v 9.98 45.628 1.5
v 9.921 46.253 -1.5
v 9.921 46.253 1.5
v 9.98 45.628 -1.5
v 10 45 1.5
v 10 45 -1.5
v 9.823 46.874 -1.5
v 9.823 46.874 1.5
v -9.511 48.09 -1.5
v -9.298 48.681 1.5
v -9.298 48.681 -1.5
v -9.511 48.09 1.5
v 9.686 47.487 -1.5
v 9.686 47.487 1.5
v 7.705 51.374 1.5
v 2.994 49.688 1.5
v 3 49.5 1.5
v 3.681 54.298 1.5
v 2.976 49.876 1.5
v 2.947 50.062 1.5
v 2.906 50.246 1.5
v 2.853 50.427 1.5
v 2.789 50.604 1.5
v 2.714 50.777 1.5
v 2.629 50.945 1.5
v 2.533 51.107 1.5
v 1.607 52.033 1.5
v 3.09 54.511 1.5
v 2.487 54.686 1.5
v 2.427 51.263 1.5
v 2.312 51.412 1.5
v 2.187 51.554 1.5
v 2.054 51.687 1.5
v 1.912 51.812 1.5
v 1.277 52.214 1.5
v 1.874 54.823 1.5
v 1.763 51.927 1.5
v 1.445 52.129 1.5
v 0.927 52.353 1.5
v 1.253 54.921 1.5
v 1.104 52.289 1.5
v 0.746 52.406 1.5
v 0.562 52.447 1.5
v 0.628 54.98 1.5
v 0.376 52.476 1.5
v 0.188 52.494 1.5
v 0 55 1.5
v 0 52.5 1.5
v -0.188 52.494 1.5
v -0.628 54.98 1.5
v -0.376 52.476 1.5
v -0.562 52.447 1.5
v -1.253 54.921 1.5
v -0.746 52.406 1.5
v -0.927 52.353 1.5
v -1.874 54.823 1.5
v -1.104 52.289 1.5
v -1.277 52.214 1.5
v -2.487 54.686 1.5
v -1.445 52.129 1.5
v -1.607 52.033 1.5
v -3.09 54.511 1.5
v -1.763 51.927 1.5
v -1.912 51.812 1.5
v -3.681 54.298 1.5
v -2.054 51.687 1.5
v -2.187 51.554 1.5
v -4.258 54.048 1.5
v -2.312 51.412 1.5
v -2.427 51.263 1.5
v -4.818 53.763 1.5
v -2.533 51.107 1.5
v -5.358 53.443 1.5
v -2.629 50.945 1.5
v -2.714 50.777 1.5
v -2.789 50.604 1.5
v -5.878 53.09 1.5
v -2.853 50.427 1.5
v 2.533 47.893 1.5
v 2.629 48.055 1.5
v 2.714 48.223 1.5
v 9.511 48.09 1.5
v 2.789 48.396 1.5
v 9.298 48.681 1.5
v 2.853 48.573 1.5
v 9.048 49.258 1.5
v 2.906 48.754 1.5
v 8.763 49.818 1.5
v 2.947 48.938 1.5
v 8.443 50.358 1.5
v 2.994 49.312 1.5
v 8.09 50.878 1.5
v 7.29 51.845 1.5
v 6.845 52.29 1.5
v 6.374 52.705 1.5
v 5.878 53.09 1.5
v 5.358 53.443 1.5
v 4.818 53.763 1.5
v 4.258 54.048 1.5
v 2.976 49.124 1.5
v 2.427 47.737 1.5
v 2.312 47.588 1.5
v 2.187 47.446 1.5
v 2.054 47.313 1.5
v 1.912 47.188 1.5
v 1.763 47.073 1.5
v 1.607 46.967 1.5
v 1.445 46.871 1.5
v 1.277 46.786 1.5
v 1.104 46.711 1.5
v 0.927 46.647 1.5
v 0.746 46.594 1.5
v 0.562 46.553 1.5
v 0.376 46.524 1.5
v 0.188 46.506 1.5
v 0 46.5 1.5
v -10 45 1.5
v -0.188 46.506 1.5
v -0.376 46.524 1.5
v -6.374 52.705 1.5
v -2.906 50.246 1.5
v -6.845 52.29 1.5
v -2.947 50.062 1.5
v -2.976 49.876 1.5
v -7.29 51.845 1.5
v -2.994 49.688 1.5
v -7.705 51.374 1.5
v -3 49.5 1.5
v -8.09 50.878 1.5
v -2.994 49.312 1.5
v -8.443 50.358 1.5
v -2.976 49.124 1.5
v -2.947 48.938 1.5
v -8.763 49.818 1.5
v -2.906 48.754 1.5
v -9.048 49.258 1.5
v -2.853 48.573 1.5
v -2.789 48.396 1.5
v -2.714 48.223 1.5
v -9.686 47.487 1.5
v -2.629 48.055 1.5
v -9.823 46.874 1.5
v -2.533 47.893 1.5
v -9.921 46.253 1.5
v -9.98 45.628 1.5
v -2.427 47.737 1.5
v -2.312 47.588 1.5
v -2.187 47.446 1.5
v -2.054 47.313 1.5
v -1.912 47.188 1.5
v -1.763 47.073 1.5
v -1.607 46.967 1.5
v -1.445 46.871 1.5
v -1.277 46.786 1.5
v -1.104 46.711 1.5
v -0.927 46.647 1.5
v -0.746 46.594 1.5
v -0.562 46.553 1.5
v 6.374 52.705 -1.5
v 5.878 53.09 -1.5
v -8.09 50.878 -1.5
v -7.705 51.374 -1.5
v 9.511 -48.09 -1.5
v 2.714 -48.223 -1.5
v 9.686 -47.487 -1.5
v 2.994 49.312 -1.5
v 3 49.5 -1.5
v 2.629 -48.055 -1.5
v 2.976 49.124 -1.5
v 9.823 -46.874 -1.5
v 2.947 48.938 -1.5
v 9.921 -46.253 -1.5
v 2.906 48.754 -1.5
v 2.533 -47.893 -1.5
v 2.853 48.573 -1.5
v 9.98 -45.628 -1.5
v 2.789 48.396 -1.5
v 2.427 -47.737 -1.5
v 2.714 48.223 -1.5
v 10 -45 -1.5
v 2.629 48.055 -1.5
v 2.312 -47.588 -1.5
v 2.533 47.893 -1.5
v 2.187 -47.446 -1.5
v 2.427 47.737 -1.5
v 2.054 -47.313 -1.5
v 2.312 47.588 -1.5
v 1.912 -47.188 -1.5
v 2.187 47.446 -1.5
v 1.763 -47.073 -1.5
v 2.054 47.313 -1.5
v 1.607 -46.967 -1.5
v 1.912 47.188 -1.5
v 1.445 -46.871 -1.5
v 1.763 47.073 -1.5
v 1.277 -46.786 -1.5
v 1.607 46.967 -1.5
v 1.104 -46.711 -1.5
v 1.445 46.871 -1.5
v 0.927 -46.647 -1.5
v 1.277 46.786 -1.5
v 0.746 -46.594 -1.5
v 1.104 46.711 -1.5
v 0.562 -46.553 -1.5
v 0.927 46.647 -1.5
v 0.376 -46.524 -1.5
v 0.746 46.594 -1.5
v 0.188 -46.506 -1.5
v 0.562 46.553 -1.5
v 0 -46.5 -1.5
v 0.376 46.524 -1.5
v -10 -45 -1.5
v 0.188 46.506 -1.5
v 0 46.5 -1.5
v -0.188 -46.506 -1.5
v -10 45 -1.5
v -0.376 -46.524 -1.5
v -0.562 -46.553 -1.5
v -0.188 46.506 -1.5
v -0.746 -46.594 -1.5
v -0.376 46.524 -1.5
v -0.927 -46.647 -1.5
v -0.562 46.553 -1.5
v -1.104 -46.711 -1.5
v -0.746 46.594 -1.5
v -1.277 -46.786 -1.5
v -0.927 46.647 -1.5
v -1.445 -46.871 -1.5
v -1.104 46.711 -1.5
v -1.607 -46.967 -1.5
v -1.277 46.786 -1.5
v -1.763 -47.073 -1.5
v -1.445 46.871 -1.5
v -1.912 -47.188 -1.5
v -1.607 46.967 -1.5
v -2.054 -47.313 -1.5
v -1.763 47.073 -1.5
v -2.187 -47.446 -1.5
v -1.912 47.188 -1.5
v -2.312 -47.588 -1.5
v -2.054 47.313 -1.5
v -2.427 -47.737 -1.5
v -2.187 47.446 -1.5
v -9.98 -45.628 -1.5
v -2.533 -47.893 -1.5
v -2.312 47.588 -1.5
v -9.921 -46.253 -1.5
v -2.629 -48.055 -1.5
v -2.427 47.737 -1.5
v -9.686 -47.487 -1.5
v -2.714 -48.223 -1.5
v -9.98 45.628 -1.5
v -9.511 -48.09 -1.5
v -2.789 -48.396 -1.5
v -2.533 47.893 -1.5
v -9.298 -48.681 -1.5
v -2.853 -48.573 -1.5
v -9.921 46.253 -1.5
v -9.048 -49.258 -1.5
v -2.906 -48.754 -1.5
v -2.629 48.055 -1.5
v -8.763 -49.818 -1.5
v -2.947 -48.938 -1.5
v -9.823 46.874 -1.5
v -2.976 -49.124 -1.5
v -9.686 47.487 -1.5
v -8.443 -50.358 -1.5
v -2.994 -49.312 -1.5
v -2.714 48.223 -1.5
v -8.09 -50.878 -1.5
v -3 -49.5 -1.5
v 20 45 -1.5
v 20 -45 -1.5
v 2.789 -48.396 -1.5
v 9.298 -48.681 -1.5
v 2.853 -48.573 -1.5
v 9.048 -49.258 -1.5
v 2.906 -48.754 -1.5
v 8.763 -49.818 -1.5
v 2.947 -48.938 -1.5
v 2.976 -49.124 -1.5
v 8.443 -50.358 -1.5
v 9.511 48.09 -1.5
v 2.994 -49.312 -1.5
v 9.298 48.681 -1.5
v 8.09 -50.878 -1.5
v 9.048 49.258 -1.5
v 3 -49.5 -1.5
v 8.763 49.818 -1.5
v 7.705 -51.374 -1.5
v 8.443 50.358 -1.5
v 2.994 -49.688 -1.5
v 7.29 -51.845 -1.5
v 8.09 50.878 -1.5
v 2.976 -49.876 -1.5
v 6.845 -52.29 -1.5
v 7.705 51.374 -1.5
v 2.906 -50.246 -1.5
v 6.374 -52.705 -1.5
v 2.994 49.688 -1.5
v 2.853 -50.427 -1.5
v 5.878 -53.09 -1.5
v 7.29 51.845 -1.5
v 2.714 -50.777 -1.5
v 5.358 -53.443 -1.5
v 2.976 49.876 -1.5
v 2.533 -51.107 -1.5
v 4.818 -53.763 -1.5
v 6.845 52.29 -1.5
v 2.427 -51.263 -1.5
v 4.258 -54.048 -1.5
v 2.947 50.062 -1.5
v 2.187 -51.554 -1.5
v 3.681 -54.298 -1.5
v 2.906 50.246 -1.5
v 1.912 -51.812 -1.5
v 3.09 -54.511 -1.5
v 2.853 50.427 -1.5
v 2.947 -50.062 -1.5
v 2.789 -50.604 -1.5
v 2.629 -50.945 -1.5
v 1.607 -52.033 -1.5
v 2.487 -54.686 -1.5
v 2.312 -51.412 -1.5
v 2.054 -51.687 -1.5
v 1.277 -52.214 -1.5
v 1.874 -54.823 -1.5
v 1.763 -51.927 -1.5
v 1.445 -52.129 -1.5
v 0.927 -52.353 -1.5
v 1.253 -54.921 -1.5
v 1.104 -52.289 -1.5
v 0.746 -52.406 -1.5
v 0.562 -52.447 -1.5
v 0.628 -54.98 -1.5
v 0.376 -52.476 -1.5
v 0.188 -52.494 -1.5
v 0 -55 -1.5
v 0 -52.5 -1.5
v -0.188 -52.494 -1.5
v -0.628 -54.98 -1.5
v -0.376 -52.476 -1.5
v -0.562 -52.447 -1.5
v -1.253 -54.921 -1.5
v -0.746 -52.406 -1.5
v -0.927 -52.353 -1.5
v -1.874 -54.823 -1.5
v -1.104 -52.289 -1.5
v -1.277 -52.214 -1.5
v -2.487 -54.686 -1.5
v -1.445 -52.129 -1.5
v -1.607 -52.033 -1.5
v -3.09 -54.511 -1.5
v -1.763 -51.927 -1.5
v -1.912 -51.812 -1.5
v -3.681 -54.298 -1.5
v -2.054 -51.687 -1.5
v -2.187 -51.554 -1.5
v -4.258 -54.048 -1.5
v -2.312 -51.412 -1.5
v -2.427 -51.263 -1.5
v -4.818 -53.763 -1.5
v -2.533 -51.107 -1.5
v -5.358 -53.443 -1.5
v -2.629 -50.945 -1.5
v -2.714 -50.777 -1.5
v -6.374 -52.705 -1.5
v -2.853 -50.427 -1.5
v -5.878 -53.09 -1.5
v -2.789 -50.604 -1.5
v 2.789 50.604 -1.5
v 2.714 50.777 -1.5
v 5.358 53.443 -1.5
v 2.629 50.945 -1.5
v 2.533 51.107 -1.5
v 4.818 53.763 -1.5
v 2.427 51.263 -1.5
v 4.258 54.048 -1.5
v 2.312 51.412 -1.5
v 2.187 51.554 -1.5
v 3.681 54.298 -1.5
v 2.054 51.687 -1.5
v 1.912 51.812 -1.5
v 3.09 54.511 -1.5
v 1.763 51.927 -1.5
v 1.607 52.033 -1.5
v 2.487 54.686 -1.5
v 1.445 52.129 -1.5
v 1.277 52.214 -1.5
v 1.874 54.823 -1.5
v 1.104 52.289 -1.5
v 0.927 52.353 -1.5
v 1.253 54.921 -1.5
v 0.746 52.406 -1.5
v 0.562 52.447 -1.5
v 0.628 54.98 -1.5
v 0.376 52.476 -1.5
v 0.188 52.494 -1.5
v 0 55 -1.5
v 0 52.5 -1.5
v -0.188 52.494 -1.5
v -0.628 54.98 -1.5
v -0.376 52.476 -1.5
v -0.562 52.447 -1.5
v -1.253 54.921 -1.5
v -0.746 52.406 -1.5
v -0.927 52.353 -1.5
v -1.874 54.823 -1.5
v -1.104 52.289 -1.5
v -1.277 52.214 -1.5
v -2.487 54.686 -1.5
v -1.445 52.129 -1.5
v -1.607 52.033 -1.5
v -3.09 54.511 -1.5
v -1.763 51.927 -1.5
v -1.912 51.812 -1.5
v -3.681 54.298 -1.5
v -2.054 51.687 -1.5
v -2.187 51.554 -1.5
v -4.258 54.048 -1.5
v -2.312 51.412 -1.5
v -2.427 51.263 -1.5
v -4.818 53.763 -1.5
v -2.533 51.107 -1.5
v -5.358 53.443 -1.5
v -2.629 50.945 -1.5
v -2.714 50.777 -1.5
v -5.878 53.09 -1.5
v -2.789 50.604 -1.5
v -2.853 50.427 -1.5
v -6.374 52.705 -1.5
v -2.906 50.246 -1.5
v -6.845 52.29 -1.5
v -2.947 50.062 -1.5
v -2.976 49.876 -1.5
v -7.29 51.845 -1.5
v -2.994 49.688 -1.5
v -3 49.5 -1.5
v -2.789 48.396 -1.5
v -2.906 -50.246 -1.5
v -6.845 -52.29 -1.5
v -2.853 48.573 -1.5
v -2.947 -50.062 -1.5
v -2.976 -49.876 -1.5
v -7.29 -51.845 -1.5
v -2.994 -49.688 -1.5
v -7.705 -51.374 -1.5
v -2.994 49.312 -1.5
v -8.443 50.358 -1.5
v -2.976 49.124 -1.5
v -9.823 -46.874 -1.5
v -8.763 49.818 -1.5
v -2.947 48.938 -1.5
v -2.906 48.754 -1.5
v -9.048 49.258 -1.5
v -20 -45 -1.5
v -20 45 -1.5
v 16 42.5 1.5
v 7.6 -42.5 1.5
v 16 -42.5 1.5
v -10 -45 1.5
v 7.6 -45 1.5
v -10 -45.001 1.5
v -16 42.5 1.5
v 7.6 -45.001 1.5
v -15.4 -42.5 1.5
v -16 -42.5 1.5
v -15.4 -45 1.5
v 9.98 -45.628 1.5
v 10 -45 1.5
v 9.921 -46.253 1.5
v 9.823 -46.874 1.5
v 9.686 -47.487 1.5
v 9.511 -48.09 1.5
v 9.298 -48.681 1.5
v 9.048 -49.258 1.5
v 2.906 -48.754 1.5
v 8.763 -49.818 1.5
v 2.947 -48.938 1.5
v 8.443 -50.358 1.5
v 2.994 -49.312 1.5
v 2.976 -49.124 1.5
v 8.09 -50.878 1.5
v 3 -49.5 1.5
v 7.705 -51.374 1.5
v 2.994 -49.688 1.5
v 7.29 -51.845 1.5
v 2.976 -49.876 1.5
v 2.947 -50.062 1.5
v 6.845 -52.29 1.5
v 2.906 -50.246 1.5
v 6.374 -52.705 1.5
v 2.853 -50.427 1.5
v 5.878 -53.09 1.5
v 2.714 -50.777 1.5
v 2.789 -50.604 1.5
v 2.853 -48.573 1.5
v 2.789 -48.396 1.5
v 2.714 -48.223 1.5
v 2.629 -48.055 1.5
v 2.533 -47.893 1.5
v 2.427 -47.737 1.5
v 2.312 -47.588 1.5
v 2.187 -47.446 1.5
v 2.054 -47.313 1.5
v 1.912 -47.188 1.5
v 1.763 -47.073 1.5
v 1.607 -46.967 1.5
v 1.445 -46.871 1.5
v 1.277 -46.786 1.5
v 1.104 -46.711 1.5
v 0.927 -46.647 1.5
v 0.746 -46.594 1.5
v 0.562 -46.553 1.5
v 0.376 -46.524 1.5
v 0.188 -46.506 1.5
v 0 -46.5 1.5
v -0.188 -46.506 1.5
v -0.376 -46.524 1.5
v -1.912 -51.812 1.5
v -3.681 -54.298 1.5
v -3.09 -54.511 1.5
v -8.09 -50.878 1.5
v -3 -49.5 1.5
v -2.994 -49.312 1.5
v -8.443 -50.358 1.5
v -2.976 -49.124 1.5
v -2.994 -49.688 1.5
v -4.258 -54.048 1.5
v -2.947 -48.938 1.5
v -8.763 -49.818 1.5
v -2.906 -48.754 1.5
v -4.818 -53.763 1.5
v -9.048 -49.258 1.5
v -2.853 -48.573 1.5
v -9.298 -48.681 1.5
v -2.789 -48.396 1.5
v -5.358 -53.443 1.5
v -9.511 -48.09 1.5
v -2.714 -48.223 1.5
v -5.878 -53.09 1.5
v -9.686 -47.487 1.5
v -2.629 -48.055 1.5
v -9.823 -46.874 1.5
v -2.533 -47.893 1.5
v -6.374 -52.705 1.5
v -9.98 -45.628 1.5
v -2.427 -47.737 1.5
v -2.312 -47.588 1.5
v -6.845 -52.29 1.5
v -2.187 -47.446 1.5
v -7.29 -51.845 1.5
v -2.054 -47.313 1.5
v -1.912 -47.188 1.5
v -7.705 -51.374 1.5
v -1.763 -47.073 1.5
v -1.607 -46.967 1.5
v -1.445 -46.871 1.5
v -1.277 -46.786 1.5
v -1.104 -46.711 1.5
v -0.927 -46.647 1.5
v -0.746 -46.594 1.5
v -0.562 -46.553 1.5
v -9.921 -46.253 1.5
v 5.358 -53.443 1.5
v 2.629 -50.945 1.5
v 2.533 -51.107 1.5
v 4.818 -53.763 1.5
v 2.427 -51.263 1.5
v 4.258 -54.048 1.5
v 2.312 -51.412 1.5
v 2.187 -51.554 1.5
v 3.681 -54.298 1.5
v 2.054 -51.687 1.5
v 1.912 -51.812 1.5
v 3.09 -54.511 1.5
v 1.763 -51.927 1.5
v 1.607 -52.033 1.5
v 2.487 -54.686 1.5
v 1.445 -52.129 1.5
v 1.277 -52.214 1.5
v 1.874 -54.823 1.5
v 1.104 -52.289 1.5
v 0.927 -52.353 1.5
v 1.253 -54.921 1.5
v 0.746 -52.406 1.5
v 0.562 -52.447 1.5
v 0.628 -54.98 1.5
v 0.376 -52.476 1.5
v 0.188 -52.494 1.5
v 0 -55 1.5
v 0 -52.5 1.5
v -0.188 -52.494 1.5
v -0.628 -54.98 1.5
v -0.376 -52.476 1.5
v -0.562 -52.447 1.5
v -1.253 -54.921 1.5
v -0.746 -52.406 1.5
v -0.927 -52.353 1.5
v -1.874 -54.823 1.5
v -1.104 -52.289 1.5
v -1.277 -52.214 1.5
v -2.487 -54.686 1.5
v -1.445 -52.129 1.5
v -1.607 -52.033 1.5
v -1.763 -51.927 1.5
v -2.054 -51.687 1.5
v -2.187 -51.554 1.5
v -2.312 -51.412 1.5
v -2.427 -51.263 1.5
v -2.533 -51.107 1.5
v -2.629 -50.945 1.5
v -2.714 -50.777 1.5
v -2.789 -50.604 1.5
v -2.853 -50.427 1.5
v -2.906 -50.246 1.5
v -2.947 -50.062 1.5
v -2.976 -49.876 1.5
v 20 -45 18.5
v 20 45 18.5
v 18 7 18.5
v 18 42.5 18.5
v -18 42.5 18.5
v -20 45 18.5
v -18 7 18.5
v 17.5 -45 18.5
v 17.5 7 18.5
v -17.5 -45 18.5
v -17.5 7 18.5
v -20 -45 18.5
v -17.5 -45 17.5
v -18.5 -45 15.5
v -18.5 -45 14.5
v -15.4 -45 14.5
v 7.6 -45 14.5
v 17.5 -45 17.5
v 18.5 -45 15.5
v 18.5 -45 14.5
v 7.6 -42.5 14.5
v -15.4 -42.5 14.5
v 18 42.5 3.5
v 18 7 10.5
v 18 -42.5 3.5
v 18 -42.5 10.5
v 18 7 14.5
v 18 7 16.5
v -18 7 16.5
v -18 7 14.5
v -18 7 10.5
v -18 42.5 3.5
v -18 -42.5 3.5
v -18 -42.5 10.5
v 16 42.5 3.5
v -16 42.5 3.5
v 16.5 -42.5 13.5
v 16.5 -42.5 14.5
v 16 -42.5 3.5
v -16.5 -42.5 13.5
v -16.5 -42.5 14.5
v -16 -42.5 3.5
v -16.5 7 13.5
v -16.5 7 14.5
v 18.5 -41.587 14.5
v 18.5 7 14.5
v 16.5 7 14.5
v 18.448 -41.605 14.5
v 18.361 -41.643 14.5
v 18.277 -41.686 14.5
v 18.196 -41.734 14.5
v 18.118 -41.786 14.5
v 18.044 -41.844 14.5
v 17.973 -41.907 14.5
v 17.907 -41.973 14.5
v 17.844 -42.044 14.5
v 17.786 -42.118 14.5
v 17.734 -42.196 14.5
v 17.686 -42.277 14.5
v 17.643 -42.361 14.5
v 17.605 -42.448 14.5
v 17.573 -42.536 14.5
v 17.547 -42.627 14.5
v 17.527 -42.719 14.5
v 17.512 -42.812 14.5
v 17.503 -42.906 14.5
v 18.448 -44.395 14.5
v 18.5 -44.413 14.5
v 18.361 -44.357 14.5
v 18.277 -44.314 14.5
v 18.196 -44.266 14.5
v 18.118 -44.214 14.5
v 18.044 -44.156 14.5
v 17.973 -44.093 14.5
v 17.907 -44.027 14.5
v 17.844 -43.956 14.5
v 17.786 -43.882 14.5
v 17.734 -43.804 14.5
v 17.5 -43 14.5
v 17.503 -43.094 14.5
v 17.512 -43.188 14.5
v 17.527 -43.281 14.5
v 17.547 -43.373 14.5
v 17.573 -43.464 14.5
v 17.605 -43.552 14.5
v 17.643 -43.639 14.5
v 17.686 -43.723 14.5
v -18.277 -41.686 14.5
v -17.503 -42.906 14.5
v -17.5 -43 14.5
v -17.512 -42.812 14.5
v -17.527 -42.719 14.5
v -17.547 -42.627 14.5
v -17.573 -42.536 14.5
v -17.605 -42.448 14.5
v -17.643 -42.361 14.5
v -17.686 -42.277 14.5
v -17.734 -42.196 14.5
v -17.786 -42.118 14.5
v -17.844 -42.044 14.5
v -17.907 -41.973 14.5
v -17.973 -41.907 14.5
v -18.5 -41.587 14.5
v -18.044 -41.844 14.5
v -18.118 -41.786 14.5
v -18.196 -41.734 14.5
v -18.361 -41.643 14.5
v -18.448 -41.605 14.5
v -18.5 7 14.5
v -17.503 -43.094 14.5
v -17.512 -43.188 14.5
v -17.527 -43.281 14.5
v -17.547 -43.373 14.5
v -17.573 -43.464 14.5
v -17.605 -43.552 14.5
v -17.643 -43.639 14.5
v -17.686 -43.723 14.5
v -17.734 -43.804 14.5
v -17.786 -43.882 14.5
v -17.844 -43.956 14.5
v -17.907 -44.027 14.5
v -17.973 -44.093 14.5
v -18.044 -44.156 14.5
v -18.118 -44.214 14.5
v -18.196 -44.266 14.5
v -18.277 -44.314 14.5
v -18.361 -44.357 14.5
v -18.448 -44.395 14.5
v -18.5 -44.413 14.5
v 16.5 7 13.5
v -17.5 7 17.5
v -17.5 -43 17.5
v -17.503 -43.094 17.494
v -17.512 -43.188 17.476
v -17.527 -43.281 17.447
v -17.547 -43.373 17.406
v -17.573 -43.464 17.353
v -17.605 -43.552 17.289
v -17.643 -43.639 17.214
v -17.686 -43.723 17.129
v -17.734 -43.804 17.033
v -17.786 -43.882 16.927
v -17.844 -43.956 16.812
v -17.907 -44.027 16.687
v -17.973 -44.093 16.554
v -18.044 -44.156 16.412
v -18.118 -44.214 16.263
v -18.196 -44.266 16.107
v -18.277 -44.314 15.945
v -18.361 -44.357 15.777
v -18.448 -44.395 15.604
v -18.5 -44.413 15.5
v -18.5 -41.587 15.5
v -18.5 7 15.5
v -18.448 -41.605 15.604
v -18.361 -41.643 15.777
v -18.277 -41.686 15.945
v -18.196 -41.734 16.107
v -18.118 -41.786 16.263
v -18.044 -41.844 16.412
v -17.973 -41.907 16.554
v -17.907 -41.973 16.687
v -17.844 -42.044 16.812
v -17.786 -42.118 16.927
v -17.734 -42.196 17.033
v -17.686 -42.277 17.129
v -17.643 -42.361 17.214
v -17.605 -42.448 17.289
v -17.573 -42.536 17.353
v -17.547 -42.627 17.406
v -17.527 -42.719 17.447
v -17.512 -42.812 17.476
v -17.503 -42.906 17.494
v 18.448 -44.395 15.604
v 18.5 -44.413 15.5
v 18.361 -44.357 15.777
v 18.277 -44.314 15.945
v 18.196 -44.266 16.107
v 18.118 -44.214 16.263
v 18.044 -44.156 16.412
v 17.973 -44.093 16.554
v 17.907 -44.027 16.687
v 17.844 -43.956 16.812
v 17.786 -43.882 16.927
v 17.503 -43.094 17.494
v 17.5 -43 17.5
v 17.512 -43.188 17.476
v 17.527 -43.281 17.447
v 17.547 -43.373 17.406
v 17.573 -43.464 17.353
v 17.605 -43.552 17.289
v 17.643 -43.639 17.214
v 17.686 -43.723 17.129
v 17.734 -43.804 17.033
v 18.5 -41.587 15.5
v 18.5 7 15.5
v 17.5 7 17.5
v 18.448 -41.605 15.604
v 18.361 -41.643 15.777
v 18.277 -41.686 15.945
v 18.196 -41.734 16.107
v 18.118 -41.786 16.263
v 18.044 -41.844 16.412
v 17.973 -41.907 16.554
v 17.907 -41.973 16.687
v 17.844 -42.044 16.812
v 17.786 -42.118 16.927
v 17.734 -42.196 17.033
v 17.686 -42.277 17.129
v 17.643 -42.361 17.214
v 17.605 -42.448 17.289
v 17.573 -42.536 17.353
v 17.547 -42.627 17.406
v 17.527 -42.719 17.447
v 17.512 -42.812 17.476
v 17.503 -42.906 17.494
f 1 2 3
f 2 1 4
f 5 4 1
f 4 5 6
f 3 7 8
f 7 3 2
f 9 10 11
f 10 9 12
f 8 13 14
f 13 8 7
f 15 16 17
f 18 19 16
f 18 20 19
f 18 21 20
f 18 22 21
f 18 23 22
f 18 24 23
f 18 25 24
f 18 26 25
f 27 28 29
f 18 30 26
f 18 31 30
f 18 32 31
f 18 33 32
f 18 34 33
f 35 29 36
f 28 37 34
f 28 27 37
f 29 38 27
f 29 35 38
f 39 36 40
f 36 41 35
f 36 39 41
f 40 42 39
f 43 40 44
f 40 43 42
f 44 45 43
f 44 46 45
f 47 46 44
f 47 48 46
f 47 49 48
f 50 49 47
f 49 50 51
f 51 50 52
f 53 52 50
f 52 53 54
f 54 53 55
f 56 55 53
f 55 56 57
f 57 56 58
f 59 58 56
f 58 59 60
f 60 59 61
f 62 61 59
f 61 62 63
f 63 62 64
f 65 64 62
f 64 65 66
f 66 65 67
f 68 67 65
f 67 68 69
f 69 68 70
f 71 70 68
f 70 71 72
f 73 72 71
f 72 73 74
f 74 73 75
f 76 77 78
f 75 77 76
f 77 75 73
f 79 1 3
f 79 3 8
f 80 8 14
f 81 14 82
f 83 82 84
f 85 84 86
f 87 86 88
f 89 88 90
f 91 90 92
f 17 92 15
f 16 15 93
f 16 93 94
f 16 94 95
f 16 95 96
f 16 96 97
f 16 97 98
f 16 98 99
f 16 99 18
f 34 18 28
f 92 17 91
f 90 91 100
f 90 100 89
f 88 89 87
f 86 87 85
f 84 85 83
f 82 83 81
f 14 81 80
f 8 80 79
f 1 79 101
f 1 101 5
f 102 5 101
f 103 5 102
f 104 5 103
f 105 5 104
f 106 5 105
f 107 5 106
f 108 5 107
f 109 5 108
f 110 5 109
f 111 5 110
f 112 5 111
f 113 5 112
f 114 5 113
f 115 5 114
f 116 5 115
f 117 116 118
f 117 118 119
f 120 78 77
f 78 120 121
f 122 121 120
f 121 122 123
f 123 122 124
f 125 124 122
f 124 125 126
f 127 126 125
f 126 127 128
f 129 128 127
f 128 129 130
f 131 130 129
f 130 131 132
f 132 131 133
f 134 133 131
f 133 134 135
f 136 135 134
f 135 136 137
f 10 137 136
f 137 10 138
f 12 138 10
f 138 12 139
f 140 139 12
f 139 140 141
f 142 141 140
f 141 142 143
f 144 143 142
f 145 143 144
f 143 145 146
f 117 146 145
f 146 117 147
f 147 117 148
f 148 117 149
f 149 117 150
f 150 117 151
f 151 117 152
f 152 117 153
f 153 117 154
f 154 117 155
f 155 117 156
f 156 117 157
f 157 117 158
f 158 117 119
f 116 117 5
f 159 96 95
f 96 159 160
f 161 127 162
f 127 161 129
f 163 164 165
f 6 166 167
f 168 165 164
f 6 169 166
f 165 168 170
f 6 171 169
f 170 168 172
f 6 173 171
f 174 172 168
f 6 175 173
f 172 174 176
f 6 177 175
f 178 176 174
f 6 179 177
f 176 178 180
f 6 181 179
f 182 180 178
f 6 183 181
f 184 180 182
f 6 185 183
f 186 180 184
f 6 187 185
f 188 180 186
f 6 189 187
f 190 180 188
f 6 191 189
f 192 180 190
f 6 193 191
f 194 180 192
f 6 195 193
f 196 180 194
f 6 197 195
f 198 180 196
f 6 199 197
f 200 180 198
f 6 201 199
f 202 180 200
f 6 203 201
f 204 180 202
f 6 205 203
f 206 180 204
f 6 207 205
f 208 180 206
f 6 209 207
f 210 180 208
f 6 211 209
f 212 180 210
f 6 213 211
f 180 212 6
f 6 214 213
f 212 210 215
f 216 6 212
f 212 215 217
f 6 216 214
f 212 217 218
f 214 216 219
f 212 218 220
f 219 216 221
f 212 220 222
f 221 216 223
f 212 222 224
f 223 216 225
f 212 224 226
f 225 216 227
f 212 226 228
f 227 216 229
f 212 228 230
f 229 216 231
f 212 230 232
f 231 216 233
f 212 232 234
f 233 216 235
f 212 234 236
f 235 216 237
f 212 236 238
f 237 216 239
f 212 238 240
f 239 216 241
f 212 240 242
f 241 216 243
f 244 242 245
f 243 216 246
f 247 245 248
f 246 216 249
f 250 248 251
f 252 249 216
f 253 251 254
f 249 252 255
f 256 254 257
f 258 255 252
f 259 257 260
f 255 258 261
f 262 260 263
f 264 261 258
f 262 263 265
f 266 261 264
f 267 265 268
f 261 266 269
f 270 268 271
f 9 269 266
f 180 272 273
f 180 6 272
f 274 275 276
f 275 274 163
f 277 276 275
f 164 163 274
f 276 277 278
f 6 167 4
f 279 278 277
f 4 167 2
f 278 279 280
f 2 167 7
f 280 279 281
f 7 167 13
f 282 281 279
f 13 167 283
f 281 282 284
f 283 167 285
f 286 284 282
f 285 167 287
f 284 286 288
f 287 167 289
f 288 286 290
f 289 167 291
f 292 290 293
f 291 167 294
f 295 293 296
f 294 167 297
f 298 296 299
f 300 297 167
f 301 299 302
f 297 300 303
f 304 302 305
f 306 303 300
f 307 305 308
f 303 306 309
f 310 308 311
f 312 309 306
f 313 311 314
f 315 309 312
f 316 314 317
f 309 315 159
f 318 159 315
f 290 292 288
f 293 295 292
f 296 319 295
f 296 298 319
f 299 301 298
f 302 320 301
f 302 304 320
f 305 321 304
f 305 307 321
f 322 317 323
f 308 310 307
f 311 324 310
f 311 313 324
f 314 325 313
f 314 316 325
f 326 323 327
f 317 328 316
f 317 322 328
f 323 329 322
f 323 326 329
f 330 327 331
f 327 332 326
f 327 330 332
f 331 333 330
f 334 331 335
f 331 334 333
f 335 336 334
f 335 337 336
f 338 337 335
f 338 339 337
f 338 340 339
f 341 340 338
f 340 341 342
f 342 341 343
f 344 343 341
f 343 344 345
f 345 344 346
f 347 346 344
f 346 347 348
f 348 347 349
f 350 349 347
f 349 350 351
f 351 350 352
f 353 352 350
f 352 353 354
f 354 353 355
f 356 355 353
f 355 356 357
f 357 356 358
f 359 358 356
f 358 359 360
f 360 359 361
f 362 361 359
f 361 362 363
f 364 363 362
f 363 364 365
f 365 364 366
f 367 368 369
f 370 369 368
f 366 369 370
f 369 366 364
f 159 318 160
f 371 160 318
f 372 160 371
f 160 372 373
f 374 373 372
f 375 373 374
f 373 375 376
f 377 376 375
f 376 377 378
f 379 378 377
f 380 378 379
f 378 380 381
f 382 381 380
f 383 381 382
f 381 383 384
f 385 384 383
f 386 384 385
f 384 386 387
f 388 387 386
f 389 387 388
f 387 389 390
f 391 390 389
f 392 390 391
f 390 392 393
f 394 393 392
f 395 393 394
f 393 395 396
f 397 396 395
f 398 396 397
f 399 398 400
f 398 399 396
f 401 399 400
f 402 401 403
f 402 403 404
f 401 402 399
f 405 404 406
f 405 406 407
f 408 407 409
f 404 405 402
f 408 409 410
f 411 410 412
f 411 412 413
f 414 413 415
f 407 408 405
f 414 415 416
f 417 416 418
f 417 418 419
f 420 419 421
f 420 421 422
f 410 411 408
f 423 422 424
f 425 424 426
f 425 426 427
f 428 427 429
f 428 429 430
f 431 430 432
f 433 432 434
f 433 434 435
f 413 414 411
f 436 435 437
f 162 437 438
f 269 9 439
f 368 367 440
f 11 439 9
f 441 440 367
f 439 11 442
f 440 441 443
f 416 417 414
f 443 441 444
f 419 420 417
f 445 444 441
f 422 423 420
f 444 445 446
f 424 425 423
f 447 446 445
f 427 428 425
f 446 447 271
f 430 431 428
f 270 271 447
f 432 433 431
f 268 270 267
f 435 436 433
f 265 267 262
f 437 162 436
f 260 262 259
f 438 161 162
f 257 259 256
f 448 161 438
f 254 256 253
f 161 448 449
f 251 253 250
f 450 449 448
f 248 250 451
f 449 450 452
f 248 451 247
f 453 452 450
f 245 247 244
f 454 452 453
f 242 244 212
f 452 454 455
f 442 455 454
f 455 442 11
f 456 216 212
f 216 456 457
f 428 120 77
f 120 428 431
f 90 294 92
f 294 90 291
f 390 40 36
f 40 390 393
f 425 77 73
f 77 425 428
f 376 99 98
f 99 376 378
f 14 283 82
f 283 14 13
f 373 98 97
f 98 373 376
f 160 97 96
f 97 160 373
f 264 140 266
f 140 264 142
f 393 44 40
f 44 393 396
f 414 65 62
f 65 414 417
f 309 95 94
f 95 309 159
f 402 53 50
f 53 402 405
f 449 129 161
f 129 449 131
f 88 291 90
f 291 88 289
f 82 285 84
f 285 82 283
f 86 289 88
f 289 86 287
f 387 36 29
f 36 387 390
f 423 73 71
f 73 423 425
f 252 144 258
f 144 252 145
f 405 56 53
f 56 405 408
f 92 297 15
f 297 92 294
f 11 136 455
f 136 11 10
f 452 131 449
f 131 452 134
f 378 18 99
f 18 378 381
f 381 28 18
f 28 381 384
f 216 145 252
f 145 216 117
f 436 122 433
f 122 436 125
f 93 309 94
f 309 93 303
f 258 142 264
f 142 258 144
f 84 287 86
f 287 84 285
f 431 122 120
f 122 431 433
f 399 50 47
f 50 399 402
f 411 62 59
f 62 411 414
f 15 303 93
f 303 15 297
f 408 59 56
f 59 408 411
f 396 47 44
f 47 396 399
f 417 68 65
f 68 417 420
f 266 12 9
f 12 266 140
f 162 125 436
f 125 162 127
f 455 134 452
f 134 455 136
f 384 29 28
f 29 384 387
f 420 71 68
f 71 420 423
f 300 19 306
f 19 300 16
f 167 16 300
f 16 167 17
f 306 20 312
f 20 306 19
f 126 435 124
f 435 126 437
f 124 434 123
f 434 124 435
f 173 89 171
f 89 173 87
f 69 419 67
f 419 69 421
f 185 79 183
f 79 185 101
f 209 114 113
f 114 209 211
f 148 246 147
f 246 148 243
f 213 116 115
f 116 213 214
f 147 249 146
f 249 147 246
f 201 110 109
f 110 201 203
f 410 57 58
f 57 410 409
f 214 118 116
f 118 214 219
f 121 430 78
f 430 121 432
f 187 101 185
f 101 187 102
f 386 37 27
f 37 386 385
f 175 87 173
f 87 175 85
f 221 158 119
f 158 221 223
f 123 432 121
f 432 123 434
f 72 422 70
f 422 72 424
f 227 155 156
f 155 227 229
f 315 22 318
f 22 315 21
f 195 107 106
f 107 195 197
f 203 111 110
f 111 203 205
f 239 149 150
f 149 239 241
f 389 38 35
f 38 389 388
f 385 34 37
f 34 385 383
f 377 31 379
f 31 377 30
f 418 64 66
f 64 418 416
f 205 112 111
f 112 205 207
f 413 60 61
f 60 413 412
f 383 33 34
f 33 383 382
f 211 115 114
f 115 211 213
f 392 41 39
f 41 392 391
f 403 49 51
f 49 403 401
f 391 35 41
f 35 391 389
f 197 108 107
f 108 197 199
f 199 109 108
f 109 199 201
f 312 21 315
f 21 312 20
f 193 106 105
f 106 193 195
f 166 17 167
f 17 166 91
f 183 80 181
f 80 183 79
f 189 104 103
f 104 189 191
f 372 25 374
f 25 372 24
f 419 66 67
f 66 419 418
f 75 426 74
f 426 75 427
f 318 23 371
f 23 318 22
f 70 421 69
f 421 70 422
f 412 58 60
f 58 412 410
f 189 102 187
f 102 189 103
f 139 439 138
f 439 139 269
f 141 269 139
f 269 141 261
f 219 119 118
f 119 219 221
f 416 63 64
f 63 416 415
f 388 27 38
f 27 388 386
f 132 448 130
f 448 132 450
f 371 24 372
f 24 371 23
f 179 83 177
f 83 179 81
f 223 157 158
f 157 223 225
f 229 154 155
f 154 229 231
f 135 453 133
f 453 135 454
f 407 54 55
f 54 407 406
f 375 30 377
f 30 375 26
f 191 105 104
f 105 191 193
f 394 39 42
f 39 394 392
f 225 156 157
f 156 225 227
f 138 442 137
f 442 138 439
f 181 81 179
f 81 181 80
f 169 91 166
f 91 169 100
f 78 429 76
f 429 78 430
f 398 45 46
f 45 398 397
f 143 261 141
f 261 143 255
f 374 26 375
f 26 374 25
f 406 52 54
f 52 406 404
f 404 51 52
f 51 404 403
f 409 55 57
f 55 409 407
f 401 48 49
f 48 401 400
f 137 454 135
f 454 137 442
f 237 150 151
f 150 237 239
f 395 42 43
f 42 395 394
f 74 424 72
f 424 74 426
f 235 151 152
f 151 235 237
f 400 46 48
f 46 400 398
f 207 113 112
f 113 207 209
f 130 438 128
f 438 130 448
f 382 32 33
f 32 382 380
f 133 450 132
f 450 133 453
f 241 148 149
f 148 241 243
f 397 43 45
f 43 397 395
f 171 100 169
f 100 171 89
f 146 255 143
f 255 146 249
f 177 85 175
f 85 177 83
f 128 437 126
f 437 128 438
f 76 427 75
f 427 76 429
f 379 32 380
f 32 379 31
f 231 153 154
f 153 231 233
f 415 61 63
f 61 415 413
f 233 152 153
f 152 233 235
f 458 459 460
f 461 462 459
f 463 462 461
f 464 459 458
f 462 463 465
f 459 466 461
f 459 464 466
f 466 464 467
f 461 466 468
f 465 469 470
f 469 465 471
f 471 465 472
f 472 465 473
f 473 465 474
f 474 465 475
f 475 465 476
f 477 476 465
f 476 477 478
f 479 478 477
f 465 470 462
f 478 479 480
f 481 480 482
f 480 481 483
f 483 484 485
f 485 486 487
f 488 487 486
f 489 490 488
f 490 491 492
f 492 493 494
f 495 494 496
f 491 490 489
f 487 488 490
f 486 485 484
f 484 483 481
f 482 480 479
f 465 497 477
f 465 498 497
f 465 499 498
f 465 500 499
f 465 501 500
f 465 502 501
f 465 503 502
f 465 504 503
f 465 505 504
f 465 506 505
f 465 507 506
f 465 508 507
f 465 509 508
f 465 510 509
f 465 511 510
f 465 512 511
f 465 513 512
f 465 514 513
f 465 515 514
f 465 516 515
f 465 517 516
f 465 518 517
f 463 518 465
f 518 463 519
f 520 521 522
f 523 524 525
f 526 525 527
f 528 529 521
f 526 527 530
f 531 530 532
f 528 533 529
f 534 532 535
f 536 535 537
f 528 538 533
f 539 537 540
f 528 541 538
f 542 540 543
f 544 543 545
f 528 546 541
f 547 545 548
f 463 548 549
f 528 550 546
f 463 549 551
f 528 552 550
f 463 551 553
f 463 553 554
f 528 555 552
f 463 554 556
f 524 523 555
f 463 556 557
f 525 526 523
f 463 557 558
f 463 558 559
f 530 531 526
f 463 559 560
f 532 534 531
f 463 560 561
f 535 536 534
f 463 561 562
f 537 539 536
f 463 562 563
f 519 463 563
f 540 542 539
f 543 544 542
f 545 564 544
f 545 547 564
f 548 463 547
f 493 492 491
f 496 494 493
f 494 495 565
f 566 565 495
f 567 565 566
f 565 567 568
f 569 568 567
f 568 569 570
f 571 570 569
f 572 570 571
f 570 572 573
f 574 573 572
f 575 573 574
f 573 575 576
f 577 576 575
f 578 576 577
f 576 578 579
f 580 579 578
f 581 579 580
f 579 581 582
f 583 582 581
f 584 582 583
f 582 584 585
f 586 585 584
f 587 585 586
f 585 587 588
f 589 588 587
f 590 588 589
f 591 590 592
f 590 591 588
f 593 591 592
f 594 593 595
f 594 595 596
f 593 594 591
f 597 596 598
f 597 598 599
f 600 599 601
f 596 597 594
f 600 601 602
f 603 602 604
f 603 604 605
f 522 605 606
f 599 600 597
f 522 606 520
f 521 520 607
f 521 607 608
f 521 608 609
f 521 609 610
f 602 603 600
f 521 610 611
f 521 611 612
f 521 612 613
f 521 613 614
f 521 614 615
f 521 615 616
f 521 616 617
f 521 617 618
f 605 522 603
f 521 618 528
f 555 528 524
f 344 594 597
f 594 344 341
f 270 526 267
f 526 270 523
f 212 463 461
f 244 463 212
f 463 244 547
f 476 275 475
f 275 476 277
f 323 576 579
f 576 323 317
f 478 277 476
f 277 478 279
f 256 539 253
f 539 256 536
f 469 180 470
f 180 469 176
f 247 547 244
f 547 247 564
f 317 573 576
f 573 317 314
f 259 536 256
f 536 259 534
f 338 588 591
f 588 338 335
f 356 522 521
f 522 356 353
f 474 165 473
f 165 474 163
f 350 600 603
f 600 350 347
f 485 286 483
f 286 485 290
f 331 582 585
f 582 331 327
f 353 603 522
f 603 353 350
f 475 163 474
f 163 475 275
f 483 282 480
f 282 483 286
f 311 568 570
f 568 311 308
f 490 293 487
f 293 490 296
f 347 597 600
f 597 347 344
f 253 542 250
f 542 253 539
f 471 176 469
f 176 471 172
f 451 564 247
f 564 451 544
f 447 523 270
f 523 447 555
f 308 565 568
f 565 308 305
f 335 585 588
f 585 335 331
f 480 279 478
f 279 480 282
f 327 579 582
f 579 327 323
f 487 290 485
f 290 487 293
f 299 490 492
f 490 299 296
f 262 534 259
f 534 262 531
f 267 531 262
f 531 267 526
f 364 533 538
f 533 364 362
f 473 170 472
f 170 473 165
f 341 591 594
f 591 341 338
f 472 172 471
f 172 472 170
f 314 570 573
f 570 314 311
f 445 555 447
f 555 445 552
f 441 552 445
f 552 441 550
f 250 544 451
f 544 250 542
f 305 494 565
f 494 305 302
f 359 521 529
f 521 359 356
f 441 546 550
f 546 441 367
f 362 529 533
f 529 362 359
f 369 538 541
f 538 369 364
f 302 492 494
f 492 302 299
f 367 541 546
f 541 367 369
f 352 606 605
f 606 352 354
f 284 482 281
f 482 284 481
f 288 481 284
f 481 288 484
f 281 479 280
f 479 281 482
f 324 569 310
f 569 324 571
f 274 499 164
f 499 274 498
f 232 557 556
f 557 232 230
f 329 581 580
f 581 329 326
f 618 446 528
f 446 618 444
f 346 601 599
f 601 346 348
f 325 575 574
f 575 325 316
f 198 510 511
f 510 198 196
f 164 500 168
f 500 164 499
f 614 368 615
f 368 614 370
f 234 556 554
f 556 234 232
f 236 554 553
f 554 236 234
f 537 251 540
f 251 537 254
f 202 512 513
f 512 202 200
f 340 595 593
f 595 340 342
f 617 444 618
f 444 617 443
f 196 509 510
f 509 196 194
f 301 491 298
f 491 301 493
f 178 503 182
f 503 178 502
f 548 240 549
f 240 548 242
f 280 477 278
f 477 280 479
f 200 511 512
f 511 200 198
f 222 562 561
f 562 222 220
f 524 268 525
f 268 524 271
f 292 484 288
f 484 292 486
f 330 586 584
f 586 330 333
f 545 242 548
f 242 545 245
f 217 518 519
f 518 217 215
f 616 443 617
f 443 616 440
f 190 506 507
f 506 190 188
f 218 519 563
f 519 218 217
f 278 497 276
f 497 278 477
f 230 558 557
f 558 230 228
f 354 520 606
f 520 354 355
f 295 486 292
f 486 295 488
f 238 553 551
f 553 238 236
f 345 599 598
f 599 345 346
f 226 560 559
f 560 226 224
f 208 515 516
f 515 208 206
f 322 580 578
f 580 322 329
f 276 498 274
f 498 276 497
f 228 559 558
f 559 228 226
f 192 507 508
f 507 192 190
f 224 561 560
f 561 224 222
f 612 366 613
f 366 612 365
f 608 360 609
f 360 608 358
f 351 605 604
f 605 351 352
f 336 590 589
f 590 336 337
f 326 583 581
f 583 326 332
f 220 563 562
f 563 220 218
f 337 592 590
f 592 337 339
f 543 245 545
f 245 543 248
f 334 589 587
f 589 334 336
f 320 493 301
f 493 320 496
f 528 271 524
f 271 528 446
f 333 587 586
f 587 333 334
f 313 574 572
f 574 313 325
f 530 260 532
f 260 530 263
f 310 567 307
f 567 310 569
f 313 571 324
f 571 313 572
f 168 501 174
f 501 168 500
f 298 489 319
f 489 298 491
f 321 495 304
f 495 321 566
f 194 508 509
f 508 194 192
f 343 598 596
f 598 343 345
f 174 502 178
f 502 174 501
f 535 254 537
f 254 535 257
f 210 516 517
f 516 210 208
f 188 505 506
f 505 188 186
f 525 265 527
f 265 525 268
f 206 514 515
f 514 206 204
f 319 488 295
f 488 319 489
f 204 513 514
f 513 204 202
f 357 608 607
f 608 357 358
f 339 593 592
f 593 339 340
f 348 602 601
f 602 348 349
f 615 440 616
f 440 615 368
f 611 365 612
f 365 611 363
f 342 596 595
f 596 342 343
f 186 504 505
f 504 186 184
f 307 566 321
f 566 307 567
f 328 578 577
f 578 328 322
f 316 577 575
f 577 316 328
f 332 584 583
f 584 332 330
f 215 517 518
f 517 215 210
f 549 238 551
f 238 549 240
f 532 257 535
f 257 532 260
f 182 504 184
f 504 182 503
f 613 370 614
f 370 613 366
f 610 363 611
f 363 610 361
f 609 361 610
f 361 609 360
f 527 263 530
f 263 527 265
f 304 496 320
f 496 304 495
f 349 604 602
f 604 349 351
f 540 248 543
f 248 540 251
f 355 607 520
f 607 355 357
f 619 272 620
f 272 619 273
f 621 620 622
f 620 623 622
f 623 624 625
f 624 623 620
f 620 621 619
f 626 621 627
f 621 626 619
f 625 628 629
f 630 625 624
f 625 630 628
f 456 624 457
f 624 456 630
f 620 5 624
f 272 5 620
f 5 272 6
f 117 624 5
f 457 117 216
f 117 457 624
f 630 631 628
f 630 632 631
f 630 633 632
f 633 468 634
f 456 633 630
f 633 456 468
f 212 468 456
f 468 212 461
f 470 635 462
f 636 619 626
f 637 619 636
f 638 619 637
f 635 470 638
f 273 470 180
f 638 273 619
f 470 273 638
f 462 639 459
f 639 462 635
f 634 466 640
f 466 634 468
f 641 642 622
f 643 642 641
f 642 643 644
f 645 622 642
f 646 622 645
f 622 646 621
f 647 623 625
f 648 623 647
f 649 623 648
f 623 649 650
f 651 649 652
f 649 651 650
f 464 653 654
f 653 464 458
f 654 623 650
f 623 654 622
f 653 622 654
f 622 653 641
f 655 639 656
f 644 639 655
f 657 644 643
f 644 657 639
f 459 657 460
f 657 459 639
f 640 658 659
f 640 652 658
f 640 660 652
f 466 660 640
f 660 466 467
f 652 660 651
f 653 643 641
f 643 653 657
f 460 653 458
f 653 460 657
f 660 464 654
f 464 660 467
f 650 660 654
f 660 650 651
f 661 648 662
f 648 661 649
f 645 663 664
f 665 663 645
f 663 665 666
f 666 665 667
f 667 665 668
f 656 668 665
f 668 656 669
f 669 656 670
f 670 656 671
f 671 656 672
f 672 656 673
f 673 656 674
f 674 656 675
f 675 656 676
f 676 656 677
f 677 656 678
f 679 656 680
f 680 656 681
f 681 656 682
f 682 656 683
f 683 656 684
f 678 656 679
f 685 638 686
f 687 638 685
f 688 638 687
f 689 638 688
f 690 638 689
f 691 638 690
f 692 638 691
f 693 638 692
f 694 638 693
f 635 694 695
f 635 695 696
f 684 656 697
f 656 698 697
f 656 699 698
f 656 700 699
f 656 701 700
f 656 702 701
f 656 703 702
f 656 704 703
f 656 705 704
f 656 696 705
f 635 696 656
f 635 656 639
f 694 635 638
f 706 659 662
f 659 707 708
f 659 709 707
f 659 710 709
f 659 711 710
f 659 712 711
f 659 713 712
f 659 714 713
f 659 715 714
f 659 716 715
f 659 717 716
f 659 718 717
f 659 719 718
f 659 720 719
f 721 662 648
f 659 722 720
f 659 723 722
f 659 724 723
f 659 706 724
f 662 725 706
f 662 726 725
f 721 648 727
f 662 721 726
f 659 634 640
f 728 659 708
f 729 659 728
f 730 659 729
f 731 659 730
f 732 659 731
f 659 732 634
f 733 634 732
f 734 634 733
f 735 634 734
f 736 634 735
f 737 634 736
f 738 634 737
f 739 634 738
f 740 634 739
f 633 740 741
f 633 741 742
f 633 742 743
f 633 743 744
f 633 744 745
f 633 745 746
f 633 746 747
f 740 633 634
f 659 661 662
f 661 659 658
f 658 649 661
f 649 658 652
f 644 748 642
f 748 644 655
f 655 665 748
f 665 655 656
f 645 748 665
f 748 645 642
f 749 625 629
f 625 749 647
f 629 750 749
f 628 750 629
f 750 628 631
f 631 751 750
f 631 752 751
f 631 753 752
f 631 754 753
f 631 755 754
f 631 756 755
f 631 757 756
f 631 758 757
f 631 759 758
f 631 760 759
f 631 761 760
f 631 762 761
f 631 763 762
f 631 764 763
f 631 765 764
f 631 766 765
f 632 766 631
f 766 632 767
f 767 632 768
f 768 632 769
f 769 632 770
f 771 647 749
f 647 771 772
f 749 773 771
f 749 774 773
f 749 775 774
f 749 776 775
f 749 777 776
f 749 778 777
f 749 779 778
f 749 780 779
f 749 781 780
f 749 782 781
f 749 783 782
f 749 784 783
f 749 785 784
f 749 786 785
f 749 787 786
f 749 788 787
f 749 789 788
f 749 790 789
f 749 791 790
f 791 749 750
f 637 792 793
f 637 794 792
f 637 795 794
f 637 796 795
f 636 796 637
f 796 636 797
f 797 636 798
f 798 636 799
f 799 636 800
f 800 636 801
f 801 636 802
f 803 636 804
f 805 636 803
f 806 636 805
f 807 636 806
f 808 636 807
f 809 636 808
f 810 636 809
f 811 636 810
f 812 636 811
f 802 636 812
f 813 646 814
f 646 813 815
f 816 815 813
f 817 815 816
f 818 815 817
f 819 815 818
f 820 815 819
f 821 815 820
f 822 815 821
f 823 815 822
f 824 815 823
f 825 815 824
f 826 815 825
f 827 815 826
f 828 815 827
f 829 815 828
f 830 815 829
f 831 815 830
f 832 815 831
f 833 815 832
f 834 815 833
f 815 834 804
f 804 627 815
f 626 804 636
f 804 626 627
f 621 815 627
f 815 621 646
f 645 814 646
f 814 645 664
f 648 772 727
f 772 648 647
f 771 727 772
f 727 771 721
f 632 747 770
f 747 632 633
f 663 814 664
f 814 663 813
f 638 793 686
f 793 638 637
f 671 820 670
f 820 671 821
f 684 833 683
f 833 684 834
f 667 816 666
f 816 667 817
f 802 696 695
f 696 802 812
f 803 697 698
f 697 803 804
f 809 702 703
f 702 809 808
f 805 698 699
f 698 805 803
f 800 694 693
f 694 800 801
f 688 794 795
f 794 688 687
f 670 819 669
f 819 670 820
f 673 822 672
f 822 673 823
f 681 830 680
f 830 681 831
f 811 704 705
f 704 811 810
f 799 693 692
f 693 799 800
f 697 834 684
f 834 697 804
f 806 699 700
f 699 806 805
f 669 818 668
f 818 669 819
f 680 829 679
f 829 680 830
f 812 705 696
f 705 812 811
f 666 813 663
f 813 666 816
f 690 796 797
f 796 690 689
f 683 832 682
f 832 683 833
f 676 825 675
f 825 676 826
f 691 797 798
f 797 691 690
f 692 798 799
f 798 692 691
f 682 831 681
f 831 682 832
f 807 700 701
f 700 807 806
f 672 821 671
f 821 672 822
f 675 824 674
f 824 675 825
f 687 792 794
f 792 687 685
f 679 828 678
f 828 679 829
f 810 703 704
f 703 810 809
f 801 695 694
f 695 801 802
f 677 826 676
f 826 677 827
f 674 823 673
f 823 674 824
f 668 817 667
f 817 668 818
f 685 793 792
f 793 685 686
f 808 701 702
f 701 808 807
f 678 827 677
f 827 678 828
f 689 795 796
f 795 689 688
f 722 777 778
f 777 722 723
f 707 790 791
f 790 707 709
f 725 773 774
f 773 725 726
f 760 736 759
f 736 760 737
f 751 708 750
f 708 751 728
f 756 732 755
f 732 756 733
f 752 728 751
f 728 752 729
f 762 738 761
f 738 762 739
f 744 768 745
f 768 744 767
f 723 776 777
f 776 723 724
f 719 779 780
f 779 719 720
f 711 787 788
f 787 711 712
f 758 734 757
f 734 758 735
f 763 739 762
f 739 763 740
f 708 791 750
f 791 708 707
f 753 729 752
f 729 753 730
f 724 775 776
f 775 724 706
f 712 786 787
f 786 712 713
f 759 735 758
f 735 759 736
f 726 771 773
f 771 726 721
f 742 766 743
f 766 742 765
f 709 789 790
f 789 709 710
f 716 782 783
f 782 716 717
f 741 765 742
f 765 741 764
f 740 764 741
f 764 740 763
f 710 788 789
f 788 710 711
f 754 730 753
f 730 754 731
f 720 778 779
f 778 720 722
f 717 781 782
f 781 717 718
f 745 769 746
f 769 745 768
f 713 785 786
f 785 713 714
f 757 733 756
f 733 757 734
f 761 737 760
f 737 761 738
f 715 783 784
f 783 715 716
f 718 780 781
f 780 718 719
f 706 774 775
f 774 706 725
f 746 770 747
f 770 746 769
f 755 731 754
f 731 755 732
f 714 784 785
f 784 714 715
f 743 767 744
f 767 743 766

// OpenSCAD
//color("red",0.8) translate([0,0,-1.5]) import("doboz_v4-Also2.stl");
//color("pink",0.8)translate([0,0,-1.5]) import("doboz_v4-Felso2.stl");

//color("lightblue",0.8) translate([0,0,14.5]) import("doboz_v5_felso.stl");

$fn=100;

color("#b0b0b0",0.8)
render(){


difference(){//alsó rész mínusz felső rész
	//alsó rész:
	union(){
		//belső lenti perem #1:
		translate([16,-42.5,1.5])
			cube([2,85,2], center=false);
		//belső lenti perem 2#:
		translate([-18,-42.5,1.5])
			cube([2,85,2], center=false);
		
		render()
		difference(){
			union(){
				translate([0,0,8.5])
					cube([40,90,20], center=true);

				translate([0,45,0])
					difference(){
						cylinder(r=10,h=3,center=true);
						translate([0,4.5,0])
							cylinder(r=3,h=10,center=true);
					}

				translate([0,-45,0])
					difference(){
						cylinder(r=10,h=3,center=true);
						translate([0,-4.5,0])
							cylinder(r=3,h=10,center=true);
					}
			}
			
			//oldalfalból kivágott hely csatlakozóknak
			translate([-15.4,-45.001,1.5])
				cube([23,2.502,30],center=false);
			
			//középső üreg:
			translate([-18,-42.5,1.5])
				cube([36,85,40], center=false);
		}
		//felső részt alulról tartó háromszög sávok:
		translate([-18,7,10.5])
			rotate([90,0,0])
				linear_extrude(52)
				polygon([ [0,0], [1.5,3], [1.5,4], [0,4] ]);
		mirror([1,0,0])
		translate([-18,7,10.5])
			rotate([90,0,0])
				linear_extrude(52)
				polygon([ [0,0], [1.5,3], [1.5,4], [0,4] ]);
		//felső részt felülrőlról tartó háromszög sávok:
		translate([-18.5,7,15.5])
			rotate([90,0,0])
				linear_extrude(52)
				polygon([ [0,0], [1,2], [1,3], [0,3] ]);
		mirror([1,0,0])
		translate([-18.5,7,15.5])
			rotate([90,0,0])
				linear_extrude(52)
				polygon([ [0,0], [1,2], [1,3], [0,3] ]);
	}
	
	//felső rész trapéz-szerű alapja a kivonáshoz:
	union(){
		translate([0,7,14.5])
			rotate([90,0,0])
				linear_extrude(52)
				polygon([ [-18.5,0], [18.5,0], [18.5,1], [17.5,3], [17.5,4], [-17.5,4], [-17.5, 3], [-18.5,1] ]);
	}
}//alsó rész mínusz felső rész

//fél hengerek a rögzítéshez:
translate([19,-43,15.5])
	difference(){
		cylinder(r=1.5, h=4, center=true);
		translate([0,-5,-5])cube([10,10,10]);
	}
mirror([1,0,0])
translate([19,-43,15.5])
	difference(){
		cylinder(r=1.5, h=4, center=true);
		translate([0,-5,-5])cube([10,10,10]);
	}


}//render
